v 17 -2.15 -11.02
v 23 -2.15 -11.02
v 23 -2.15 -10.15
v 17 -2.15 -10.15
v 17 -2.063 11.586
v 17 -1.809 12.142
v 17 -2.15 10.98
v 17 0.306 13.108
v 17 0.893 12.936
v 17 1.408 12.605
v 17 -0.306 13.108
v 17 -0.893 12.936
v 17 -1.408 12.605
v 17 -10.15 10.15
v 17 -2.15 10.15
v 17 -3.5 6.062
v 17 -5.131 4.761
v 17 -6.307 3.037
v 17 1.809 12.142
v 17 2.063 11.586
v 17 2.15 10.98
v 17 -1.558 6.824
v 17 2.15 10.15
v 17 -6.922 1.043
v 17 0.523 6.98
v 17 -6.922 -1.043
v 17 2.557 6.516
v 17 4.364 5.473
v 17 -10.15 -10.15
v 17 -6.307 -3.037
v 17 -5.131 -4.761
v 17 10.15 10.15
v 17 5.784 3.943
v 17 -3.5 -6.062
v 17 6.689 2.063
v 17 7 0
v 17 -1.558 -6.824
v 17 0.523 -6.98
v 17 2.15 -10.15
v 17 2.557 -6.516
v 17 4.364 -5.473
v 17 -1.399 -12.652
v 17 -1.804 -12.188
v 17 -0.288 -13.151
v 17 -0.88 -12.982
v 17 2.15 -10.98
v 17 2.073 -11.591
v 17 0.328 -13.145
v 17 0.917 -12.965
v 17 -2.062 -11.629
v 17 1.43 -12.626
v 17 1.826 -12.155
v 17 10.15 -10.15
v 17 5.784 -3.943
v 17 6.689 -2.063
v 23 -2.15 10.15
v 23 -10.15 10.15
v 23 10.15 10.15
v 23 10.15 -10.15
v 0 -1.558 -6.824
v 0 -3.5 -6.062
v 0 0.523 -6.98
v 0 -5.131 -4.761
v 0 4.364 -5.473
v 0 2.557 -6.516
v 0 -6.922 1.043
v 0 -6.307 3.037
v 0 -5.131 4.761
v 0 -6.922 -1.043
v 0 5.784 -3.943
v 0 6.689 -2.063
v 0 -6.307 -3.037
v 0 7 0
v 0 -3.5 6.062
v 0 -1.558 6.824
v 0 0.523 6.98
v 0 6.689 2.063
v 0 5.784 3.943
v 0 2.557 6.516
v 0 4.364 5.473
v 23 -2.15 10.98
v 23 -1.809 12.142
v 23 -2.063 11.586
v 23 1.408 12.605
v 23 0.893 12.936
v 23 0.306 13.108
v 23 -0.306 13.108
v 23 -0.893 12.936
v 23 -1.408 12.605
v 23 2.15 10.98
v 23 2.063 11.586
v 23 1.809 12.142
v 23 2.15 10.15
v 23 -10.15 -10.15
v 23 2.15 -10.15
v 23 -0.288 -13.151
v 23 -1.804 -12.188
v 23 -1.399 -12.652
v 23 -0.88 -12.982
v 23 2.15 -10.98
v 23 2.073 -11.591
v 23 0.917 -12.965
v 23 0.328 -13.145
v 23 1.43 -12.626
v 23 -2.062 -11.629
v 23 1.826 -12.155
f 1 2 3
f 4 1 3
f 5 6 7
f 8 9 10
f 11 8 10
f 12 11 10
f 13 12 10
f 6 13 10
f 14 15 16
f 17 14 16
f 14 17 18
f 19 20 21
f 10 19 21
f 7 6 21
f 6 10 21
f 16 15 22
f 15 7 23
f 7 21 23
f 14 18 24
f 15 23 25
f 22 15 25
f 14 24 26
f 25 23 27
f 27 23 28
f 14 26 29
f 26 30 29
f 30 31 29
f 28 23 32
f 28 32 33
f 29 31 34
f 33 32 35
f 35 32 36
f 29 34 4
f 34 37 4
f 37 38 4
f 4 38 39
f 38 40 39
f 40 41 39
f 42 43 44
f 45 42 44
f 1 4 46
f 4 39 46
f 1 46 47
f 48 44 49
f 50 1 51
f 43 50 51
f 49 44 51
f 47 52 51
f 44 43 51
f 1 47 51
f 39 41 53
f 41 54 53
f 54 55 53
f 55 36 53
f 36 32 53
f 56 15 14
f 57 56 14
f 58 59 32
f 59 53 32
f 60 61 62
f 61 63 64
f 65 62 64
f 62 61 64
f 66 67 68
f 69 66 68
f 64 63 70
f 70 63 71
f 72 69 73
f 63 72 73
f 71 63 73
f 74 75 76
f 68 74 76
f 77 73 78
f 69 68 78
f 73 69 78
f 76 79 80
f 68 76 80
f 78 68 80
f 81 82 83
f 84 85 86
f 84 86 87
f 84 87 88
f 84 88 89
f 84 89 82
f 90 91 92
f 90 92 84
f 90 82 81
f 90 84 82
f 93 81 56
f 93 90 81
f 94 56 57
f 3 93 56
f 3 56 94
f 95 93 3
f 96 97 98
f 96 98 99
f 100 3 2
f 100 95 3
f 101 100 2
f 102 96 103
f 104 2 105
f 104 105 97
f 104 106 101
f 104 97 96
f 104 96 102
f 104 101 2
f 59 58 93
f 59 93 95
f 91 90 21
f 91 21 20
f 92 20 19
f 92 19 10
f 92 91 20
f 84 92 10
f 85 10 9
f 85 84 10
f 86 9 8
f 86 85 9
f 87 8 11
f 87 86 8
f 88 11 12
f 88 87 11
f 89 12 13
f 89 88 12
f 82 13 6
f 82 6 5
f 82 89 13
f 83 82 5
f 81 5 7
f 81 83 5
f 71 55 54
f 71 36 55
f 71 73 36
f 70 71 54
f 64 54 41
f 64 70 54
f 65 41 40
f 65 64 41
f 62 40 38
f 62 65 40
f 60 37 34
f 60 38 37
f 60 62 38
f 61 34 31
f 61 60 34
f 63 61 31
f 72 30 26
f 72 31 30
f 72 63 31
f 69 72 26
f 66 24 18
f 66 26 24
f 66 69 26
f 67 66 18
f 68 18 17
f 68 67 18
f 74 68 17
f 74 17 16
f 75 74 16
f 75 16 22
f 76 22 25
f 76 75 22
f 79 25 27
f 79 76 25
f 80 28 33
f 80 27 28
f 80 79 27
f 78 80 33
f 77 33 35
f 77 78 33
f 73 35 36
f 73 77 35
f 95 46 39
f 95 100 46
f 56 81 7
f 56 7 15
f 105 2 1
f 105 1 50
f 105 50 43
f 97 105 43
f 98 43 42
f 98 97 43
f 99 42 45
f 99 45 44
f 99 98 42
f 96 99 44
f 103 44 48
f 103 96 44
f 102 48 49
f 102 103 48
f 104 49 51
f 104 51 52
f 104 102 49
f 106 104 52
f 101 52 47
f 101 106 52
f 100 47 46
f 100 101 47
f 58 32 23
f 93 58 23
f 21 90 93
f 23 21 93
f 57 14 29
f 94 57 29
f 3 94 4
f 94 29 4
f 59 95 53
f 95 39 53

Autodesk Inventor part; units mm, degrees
ref_plane "YZ Plane" through (0, 0, 0) normal (1, 0, 0) x (0, 1, 0)
ref_plane "XZ Plane" through (0, 0, 0) normal (0, 1, 0) x (-1, 0, 0)
ref_plane "XY Plane" through (0, 0, 0) normal (0, 0, 1) x (1, 0, 0)
sketch "Sketch1" plane through (0, 0, 0) normal (1, 0, 0) x (0, 1, 0)
  circle A0 centre (0, 0) radius 7
  dimension "d0" = 14
extrude "Extrusion1" add sketch "Sketch1" along normal blind 17
sketch "Sketch2" plane through (17, 0, 0) normal (1, 0, 0) x (0, 0, -1)
  line L0 (-10.15, -10.15) -> (10.15, -10.15)
  line L1 (10.15, -10.15) -> (10.15, 10.15)
  line L2 (10.15, 10.15) -> (-10.15, 10.15)
  line L3 (-10.15, 10.15) -> (-10.15, -10.15)
  line L4 (-10.15, -10.15) -> (10.15, 10.15) construction
  line L5 (10.15, -10.15) -> (-10.15, 10.15) construction
  point P0 (0, 0)
  dimension "d3" = 20.3
  dimension "d4" = 20.3
extrude "Extrusion2" add sketch "Sketch2" along normal blind 6
sketch "Sketch3" plane through (23, 0, 0) normal (1, 0, 0) x (0, 0, -1)
  arc A0 (-10.98, 2.1499) -> (-10.98, -2.1501) centre (-10.98, -0.0001) ccw
  arc A1 (11.02, -2.1497) -> (10.98, 2.1499) centre (11.02, 0.0003) ccw
  line L0 (10.15, -10.15) -> (10.15, 10.15) projected
  line L1 (-10.15, 10.15) -> (-10.15, -10.15) projected
  line L2 (-10.98, 2.1499) -> (-10.15, 2.1499)
  line L3 (-10.98, -2.1501) -> (-10.15, -2.1501)
  line L4 (10.98, 2.1499) -> (10.15, 2.1499)
  line L5 (11.02, -2.1497) -> (10.15, -2.1497)
  line L6 (-10.15, 2.1499) -> (-10.15, -2.1501)
  line L7 (10.15, 2.1499) -> (10.15, -2.1497)
  point P0 (0, 0)
  dimension "d7" = 4.3
  dimension "d8" = 4.3
  dimension "d13" = 22
extrude "Extrusion3" add sketch "Sketch3" against normal up to surface (6 mm away)
properties part number "camera_Fatshark_600TVL"
